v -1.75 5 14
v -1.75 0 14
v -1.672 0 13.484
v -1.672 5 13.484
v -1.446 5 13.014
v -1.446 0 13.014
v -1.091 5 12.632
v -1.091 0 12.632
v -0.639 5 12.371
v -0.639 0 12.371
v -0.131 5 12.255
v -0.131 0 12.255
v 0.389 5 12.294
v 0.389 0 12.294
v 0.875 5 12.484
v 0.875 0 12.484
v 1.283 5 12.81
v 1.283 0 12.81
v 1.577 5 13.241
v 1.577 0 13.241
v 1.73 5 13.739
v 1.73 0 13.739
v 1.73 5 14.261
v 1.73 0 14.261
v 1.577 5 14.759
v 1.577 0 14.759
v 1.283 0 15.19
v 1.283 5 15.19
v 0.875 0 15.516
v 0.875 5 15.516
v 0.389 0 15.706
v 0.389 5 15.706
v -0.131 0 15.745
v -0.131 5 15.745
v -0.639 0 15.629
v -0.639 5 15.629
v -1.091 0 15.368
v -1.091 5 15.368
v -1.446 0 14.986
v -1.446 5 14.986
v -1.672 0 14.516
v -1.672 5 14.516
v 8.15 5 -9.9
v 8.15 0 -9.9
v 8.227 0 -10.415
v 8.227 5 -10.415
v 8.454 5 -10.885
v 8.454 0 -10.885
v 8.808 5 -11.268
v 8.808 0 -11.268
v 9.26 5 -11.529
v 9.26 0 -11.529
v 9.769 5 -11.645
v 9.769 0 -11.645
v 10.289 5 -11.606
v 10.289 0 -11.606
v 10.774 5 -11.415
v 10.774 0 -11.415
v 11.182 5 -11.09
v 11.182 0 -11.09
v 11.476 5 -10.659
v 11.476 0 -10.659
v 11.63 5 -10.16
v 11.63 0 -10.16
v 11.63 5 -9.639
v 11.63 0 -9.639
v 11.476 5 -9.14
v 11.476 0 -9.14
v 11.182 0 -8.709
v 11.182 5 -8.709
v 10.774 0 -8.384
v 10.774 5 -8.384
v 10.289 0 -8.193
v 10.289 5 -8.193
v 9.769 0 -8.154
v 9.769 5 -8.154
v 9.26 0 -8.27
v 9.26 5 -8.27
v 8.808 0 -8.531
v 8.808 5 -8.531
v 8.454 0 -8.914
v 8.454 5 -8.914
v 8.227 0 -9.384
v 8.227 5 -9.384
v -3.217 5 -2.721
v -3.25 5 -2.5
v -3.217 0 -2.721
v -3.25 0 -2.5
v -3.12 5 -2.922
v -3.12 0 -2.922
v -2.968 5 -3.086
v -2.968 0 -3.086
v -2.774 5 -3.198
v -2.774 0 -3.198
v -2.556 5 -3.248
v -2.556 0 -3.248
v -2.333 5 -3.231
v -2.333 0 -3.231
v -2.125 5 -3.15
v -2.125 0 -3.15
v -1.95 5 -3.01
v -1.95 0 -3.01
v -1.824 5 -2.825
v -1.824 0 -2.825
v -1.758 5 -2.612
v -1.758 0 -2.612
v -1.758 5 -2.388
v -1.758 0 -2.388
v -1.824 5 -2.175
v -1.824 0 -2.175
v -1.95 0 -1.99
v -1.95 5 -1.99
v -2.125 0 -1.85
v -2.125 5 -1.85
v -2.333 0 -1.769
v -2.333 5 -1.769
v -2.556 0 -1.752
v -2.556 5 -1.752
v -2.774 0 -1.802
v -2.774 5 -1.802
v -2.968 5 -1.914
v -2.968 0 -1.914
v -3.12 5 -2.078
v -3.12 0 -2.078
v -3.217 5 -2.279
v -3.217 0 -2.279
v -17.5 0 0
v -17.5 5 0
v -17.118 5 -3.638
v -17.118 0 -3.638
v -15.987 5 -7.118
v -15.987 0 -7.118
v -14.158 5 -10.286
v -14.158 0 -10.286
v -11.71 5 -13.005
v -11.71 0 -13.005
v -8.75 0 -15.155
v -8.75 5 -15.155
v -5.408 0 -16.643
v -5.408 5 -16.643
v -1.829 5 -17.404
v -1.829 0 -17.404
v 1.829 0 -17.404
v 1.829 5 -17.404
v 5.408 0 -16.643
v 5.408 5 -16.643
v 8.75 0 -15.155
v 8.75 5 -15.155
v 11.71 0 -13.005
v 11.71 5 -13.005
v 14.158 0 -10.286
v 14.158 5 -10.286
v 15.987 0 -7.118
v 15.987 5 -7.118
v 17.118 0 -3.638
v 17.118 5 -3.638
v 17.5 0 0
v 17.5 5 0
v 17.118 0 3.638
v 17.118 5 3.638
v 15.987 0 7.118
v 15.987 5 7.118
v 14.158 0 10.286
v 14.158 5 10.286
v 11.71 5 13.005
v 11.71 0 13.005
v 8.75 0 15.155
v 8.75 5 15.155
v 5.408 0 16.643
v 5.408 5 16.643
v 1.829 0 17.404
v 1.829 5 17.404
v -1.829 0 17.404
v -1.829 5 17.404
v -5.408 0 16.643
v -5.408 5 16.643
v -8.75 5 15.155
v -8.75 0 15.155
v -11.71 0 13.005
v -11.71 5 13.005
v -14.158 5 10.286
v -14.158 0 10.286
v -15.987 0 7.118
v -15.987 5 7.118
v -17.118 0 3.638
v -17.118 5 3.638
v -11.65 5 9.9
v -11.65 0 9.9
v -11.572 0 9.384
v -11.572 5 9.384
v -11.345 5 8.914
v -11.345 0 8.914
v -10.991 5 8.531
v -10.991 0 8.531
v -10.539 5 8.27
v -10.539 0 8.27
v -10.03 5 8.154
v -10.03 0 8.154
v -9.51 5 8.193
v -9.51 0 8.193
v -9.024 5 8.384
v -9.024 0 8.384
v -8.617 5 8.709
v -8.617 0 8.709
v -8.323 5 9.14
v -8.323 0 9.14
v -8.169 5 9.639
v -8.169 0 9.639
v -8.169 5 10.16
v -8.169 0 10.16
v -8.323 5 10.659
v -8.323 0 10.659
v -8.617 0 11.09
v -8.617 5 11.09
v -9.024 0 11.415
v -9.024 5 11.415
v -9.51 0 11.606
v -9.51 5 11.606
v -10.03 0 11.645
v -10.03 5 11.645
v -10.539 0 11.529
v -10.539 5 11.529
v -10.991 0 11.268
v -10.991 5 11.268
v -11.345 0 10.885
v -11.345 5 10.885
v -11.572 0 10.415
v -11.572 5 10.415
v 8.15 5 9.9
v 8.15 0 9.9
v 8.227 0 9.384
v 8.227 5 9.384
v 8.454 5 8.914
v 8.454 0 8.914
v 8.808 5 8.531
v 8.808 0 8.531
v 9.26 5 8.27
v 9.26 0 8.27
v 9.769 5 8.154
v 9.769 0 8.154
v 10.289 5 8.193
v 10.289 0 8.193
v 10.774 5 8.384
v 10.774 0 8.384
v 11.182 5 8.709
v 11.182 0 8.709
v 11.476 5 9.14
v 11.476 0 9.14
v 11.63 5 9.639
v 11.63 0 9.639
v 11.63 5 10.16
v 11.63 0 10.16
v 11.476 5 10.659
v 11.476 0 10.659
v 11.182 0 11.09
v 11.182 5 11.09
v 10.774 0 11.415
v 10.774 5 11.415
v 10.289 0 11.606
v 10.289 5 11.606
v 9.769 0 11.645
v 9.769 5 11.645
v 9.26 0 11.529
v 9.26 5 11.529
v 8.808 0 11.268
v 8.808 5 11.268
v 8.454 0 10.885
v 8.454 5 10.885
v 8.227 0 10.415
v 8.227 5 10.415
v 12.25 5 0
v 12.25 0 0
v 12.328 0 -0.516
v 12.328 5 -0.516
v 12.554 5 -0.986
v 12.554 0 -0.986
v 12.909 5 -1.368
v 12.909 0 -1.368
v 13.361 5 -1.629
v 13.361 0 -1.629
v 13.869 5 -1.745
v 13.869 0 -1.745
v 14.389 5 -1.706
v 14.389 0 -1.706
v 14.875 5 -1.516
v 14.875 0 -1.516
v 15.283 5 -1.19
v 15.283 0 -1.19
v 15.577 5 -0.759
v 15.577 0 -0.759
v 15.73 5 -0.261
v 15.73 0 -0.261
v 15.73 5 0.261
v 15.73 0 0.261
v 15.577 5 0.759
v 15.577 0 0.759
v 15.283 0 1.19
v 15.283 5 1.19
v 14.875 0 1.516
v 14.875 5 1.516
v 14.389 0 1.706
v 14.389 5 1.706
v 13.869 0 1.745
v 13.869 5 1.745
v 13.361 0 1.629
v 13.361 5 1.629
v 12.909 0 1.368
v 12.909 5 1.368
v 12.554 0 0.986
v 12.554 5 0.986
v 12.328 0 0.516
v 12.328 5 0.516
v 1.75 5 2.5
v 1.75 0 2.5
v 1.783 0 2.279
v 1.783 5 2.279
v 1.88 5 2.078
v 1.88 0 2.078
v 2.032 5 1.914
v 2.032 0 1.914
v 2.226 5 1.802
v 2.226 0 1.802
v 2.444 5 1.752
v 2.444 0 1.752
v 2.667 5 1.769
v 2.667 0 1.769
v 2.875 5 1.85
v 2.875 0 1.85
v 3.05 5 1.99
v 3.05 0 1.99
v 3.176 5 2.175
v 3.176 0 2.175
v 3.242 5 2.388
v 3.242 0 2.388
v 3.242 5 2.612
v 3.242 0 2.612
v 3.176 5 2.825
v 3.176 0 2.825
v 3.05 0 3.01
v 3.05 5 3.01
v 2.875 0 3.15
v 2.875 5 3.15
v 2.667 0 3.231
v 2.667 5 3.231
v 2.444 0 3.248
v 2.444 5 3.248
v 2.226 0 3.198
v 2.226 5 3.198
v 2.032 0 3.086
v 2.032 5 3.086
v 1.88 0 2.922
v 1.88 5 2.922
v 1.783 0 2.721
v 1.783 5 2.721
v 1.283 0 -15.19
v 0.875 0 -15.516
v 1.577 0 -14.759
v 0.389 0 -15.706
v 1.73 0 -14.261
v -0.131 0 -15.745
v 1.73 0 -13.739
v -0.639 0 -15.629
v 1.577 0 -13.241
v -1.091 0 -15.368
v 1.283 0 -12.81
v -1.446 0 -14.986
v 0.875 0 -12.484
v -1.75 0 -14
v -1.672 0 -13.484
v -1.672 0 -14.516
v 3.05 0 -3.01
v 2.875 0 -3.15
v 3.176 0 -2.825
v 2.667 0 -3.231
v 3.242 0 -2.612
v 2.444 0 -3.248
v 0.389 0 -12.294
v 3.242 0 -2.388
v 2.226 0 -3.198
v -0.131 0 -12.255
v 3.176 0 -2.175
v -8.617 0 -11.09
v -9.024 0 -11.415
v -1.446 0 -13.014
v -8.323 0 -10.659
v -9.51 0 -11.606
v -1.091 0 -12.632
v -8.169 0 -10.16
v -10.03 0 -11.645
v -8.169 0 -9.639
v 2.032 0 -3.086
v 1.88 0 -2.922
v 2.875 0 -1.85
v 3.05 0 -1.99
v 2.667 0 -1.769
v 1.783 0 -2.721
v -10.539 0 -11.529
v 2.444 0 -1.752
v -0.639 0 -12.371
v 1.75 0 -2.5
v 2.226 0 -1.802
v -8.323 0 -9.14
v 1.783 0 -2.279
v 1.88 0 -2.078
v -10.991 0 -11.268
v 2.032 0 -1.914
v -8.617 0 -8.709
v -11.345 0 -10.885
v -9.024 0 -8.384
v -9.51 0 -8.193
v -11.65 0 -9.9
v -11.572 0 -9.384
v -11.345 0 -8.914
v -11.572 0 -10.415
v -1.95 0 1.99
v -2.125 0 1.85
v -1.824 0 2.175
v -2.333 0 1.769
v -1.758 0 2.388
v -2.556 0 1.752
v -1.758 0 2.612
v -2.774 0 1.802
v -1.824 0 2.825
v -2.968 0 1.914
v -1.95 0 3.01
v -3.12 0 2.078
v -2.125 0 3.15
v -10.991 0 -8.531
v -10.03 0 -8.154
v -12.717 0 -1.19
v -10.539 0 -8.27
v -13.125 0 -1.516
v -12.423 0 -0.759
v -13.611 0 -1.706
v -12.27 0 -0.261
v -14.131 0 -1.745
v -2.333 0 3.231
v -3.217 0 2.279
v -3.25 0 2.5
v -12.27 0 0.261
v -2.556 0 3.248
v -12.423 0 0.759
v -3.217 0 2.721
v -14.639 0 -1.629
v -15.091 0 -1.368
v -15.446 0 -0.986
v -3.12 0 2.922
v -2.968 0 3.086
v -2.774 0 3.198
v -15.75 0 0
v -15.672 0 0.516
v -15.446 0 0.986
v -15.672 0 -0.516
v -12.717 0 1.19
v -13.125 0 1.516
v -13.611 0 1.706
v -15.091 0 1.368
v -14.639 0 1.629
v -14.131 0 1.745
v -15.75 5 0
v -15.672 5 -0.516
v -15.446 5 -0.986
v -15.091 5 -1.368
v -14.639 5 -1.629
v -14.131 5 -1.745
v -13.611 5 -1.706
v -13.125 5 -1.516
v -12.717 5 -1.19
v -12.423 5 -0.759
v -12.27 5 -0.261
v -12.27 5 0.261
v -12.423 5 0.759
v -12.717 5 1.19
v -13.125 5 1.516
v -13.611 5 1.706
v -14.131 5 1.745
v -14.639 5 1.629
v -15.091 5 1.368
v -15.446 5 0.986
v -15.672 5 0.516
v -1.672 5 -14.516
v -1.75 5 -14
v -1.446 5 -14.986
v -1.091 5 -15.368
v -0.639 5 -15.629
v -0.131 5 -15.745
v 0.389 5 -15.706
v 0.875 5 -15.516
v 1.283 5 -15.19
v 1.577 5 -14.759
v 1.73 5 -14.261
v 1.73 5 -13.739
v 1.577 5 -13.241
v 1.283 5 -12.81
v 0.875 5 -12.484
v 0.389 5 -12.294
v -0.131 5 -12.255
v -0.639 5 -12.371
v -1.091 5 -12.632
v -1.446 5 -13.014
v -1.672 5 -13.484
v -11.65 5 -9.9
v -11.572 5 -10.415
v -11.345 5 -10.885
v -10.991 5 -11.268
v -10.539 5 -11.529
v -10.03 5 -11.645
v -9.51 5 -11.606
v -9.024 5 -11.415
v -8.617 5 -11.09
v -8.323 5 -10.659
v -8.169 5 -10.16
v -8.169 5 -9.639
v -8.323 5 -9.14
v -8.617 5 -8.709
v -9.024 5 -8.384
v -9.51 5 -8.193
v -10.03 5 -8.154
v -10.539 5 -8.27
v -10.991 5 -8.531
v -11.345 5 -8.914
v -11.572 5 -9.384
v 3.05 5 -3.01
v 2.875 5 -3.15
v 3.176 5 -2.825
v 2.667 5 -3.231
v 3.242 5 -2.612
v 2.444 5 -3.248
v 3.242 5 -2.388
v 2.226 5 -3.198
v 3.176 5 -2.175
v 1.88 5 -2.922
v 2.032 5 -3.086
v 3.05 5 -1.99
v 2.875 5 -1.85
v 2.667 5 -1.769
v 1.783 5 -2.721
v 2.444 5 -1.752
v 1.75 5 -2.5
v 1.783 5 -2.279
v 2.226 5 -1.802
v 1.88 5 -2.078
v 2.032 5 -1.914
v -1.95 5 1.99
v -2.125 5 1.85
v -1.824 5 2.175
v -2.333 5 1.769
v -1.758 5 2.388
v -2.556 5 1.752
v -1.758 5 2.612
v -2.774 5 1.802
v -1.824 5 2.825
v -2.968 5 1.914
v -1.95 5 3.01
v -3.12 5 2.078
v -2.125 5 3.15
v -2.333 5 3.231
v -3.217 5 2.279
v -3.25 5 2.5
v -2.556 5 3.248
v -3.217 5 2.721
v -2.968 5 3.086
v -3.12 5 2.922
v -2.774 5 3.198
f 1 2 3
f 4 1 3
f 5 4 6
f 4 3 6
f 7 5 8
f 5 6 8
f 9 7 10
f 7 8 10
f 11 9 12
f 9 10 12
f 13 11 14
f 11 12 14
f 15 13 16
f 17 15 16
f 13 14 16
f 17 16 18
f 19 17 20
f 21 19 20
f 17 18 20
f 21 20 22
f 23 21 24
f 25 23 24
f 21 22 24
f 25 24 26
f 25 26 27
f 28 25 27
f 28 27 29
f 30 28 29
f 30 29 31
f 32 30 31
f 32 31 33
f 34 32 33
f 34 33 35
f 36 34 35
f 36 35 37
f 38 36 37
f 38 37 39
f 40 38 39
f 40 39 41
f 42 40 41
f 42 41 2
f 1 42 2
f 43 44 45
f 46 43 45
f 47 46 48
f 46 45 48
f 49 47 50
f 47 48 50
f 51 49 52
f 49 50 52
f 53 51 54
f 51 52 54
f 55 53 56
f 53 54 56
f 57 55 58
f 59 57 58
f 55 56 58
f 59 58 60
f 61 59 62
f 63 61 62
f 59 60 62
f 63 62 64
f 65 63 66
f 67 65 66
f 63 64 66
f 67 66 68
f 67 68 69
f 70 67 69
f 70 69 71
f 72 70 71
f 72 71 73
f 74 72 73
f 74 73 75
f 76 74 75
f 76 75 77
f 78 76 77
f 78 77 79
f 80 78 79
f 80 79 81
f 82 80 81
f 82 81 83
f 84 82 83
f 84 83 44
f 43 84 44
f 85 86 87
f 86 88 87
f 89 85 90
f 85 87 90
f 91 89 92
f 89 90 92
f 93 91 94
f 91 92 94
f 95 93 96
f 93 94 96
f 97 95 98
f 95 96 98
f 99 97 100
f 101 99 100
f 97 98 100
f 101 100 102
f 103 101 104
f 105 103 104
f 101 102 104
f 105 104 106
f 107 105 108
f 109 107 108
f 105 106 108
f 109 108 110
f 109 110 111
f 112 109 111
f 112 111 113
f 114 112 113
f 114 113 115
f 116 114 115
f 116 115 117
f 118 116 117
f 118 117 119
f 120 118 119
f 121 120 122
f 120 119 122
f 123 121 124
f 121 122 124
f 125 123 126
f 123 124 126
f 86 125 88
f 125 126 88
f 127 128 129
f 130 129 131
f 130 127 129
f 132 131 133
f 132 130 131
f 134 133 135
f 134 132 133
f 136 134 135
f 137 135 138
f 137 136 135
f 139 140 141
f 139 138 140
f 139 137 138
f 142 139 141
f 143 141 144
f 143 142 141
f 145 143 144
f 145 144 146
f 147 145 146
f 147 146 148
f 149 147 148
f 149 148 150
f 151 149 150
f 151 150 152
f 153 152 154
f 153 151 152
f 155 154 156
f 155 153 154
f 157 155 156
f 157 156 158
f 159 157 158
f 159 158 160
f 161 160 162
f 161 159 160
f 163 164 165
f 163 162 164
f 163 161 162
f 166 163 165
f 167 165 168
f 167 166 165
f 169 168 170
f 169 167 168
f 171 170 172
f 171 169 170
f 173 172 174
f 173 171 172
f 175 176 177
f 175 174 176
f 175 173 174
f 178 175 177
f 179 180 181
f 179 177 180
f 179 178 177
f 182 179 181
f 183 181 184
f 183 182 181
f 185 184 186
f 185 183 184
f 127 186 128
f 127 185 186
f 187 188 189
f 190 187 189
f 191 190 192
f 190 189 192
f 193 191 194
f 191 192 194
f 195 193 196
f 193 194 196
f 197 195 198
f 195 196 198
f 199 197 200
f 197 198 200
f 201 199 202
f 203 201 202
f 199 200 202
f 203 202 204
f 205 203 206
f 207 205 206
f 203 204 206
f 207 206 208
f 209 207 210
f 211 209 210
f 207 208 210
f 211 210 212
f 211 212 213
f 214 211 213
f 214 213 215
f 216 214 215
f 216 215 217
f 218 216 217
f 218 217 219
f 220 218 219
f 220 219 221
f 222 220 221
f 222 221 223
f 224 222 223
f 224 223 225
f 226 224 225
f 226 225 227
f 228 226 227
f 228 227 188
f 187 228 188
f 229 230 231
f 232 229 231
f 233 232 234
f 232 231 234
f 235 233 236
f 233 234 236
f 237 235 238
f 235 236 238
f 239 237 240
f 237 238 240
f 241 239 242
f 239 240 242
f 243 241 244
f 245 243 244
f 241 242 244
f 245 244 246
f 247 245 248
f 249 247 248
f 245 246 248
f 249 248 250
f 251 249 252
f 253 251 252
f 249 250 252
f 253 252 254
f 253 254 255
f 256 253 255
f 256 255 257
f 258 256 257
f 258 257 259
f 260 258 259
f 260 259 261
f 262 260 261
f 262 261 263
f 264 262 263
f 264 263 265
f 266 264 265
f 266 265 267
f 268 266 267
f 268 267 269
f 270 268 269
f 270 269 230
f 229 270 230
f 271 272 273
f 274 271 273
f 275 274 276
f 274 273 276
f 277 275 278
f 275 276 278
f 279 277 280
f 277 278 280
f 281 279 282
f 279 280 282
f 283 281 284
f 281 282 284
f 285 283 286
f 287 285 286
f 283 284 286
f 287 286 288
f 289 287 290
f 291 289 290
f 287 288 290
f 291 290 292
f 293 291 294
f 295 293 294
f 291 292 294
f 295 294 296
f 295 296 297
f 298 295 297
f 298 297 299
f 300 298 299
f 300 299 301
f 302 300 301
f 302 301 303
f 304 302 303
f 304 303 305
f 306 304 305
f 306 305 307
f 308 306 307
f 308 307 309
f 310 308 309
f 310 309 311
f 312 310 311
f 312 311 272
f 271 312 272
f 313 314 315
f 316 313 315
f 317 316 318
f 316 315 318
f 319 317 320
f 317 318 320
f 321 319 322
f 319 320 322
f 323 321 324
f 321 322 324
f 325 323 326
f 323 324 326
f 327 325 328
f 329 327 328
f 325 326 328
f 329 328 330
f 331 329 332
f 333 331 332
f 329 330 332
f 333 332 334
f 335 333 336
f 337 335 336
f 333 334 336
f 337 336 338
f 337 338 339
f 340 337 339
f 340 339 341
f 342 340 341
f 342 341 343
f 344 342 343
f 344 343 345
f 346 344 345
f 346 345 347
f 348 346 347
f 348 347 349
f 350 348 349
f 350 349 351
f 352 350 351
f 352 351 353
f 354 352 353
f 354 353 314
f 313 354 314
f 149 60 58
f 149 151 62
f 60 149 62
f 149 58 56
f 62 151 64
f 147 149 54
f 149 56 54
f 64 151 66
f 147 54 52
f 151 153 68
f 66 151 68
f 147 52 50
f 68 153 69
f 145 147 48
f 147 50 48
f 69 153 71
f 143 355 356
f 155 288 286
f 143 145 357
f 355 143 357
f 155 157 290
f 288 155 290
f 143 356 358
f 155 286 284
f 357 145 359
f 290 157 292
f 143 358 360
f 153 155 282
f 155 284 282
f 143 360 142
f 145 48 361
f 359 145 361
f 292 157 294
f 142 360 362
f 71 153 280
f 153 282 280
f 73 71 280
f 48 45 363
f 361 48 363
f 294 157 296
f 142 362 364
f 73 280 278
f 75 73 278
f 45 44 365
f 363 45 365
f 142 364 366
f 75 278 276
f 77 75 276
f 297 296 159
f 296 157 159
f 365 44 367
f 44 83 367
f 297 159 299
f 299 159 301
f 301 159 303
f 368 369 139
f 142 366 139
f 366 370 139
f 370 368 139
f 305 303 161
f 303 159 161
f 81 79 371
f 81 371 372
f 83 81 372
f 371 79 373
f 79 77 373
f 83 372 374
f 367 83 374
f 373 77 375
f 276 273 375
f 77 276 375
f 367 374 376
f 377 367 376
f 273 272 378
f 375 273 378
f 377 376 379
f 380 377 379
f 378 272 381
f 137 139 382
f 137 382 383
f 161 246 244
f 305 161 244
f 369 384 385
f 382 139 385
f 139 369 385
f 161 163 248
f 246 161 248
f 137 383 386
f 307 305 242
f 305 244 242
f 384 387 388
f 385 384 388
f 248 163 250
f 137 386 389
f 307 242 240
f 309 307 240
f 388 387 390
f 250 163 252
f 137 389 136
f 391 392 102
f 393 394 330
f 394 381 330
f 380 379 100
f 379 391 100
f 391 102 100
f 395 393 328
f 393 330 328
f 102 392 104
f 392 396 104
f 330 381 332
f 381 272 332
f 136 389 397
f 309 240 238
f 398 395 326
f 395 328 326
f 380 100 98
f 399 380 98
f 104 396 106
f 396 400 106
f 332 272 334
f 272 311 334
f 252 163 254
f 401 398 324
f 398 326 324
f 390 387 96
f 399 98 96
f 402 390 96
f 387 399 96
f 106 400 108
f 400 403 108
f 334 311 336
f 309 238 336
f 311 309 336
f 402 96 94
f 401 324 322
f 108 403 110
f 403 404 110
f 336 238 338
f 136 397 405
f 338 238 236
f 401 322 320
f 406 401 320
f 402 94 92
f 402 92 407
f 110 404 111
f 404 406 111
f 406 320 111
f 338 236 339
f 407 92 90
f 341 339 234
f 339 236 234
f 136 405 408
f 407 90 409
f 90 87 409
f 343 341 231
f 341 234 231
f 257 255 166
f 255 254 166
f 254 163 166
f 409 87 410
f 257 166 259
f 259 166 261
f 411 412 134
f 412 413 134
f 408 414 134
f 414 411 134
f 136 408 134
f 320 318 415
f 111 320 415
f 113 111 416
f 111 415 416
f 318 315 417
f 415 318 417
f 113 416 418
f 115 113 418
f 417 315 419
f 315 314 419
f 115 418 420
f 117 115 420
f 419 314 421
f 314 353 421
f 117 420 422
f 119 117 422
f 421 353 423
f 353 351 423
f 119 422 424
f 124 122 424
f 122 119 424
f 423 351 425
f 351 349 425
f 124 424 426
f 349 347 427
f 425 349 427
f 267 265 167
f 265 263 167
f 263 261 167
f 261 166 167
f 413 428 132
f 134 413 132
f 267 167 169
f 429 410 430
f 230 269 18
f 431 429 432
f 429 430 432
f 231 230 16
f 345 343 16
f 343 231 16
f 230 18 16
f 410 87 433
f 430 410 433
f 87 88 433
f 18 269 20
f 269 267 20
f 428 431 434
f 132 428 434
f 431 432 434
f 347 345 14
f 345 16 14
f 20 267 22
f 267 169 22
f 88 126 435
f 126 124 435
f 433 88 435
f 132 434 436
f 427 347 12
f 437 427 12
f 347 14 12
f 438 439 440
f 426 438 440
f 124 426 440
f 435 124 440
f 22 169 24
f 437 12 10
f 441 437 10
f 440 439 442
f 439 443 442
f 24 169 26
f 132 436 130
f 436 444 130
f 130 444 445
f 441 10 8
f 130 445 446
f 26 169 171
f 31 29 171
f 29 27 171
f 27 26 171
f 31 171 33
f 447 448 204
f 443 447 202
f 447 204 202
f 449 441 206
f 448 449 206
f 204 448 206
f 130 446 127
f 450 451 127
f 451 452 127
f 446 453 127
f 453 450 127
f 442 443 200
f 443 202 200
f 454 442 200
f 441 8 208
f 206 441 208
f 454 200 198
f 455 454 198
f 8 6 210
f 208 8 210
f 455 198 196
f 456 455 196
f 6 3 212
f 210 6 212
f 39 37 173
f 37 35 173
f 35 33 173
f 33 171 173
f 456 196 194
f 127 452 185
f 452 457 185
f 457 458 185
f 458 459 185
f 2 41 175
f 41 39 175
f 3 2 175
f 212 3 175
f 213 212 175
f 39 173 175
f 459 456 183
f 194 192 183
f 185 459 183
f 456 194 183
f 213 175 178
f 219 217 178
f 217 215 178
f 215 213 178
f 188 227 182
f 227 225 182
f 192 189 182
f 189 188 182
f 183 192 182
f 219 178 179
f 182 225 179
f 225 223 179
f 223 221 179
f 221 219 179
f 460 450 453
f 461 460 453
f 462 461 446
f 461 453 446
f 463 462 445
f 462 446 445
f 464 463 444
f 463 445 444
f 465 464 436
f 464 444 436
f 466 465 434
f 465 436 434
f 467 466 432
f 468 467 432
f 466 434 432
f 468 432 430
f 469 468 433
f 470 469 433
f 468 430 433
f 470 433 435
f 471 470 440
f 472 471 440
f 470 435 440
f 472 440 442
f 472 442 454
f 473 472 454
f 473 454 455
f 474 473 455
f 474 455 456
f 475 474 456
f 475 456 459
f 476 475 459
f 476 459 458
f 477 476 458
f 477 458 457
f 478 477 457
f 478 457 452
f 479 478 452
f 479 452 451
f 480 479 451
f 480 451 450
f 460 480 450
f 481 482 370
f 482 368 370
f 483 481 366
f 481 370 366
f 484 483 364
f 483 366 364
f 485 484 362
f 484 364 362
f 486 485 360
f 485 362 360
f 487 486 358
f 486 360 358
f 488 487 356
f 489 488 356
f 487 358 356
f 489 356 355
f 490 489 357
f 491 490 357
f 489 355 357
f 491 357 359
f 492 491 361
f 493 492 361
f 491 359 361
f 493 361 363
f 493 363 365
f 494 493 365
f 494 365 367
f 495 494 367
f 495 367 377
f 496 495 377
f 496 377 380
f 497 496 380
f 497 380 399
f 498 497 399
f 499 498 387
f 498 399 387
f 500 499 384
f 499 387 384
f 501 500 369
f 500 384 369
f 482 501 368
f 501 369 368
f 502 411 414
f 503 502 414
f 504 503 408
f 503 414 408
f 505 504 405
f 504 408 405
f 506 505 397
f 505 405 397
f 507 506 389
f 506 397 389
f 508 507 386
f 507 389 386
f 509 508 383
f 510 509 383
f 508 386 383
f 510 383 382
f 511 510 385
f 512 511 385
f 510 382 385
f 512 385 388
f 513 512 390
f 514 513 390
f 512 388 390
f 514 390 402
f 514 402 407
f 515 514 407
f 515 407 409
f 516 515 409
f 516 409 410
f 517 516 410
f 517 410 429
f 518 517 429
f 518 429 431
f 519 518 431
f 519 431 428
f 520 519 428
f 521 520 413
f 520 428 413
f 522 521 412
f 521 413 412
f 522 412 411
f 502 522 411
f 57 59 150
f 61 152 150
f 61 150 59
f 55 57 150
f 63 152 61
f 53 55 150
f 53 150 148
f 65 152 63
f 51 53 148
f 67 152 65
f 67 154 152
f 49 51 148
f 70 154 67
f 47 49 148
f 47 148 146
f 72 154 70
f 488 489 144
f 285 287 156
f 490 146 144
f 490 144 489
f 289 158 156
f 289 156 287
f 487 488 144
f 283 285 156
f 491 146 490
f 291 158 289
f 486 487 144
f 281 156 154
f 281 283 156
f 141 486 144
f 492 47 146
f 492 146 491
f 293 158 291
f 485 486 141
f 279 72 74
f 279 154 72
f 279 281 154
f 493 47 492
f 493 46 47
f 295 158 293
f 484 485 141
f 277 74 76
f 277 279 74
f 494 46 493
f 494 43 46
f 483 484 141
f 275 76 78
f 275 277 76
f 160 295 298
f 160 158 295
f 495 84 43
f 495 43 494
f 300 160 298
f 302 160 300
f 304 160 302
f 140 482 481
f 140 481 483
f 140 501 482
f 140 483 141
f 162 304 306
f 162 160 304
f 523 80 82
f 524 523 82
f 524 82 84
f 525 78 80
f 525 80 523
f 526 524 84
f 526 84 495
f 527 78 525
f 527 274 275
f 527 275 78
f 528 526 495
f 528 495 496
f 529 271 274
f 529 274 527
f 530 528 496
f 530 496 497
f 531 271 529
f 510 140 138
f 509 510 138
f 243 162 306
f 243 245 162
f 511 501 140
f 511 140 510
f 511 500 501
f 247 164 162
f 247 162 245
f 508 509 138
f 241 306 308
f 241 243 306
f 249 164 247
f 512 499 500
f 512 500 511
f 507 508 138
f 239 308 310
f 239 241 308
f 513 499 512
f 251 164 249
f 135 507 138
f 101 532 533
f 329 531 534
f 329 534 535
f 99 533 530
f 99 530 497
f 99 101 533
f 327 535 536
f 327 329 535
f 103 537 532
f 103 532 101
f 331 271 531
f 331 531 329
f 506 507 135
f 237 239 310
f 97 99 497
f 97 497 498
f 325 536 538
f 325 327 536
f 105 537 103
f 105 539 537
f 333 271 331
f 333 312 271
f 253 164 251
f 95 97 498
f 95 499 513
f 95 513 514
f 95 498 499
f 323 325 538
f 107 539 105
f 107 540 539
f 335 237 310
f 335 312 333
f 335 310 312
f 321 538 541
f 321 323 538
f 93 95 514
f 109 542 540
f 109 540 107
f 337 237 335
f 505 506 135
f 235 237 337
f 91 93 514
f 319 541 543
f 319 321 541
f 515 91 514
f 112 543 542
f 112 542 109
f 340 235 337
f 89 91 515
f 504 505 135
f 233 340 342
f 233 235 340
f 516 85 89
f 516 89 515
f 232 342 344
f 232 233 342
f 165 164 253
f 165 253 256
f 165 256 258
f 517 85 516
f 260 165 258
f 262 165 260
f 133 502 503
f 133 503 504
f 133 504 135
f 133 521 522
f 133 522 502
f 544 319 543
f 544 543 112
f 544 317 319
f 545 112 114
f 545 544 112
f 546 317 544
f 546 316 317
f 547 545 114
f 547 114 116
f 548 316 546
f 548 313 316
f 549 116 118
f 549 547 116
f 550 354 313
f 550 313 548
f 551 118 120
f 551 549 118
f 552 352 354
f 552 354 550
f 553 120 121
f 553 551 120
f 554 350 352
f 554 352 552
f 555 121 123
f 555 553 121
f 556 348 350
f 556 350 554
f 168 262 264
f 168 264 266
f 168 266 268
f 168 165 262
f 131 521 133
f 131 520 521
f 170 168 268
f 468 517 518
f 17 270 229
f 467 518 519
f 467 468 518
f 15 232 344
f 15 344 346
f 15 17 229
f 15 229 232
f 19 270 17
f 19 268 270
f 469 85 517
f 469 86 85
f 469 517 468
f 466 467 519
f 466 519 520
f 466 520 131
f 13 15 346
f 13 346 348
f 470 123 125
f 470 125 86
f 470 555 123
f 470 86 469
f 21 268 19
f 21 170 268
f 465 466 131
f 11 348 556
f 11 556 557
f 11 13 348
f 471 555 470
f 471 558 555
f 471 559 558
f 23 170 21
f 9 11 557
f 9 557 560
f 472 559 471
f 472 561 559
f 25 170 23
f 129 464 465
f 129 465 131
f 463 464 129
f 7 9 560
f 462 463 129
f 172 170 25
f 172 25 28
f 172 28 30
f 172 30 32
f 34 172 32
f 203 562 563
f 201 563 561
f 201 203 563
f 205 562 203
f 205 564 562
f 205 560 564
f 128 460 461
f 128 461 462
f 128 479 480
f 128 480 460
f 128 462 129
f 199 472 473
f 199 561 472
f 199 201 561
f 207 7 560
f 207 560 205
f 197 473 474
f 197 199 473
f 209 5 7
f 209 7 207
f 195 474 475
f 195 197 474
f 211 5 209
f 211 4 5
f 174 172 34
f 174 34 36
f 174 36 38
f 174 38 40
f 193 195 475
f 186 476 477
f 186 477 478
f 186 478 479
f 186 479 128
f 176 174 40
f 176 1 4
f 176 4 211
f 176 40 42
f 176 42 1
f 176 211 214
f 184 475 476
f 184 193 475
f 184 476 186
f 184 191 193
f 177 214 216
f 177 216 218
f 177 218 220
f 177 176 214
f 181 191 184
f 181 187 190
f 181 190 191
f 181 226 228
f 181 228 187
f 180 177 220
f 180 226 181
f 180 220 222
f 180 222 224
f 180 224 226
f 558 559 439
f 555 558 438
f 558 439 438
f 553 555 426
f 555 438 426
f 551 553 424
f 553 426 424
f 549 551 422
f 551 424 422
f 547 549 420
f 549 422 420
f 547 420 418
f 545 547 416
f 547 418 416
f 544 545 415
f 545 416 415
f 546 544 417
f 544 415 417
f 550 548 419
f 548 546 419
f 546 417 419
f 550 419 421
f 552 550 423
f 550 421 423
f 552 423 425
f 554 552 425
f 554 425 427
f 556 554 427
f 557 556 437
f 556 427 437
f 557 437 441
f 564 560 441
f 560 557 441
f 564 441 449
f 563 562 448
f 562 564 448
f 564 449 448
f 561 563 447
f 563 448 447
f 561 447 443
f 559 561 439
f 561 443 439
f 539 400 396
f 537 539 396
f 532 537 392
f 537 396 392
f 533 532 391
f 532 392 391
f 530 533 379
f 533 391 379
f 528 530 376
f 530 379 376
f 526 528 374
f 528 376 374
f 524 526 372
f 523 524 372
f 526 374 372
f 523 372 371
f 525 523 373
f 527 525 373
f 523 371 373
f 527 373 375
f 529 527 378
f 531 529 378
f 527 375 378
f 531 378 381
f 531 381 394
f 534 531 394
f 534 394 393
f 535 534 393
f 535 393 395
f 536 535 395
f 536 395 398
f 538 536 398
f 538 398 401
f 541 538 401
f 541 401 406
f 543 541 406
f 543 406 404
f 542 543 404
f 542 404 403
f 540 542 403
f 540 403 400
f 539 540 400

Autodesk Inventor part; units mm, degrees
ref_plane "YZ Plane" through (0, 0, 0) normal (1, 0, 0) x (0, 1, 0)
ref_plane "XZ Plane" through (0, 0, 0) normal (0, 1, 0) x (-1, 0, 0)
ref_plane "XY Plane" through (0, 0, 0) normal (0, 0, 1) x (1, 0, 0)
sketch "Szkic1" plane through (0, 0, 0) normal (0, 1, 0) x (-1, 0, 0)
  circle A0 centre (0, 0) radius 10
  circle A1 centre (0, 0) radius 17.5
  line L0 (0, 17.5) -> (0, -17.5)
  line L1 (-17.5, 0) -> (17.5, 0)
  circle A2 centre (2.5, 2.5) radius 0.75
  circle A3 centre (2.5, -2.5) radius 0.75
  circle A4 centre (-2.5, 2.5) radius 0.75
  circle A5 centre (-2.5, -2.5) radius 0.75
  circle A6 centre (0, 14) radius 1.75
  circle A7 centre (0, -14) radius 1.75
  circle A8 centre (14, 0) radius 1.75
  circle A9 centre (-14, 0) radius 1.75
  line L2 (-2.5, -2.5) -> (-12.3744, -12.3744)
  line L3 (2.5, 2.5) -> (12.3744, 12.3744)
  line L4 (2.5, -2.5) -> (12.3744, -12.3744)
  line L5 (-2.5, 2.5) -> (-12.3744, 12.3744)
  circle A10 centre (9.8995, 9.8995) radius 1.75
  circle A11 centre (-9.8995, -9.8995) radius 1.75
  line L6 (-2.5, 2.5) -> (2.5, -2.5)
  line L7 (2.5, 2.5) -> (-2.5, -2.5)
  circle A12 centre (-9.8995, 9.8995) radius 1.75
  circle A13 centre (9.8995, -9.8995) radius 1.75
  dimension "d1" = 35
  dimension "d0" = 20
  dimension "d2" = 1.5
  dimension "d3" = 5
  dimension "d4" = 5
  dimension "d5" = 28
  dimension "d6" = 3.5
  dimension "d7" = 28
  dimension "d8" = 3.5
  dimension "d9" = 3.5
  dimension "d11" = 19.799
extrude "Wyciągnięcie proste1" add sketch "Szkic1" along normal blind 5 contours L1 L7 A2 L3 A0 | L1 A8 A1 L4 A13 A0 | A0 L4 A3 L6 L1 | A0 L3 A10 A1 L1 A8 | L3 A2 L7 L0 A0 | A0 L0 A6 A1 L3 A10 | L4 A13 A1 L0 A7 A0 | A0 L0 L6 A3 L4 | L6 A4 L5 A0 L0 | L7 A5 L2 A0 L1 | L1 A0 L5 A4 L6 | L0 A0 L2 A5 L7 | A0 L5 A12 A1 L0 A6 | L0 A7 A1 L2 A11 A0 | L1 A9 A1 L5 A12 A0 | A0 L2 A11 A1 L1 A9
properties part number "Forma-kolo_dol"
